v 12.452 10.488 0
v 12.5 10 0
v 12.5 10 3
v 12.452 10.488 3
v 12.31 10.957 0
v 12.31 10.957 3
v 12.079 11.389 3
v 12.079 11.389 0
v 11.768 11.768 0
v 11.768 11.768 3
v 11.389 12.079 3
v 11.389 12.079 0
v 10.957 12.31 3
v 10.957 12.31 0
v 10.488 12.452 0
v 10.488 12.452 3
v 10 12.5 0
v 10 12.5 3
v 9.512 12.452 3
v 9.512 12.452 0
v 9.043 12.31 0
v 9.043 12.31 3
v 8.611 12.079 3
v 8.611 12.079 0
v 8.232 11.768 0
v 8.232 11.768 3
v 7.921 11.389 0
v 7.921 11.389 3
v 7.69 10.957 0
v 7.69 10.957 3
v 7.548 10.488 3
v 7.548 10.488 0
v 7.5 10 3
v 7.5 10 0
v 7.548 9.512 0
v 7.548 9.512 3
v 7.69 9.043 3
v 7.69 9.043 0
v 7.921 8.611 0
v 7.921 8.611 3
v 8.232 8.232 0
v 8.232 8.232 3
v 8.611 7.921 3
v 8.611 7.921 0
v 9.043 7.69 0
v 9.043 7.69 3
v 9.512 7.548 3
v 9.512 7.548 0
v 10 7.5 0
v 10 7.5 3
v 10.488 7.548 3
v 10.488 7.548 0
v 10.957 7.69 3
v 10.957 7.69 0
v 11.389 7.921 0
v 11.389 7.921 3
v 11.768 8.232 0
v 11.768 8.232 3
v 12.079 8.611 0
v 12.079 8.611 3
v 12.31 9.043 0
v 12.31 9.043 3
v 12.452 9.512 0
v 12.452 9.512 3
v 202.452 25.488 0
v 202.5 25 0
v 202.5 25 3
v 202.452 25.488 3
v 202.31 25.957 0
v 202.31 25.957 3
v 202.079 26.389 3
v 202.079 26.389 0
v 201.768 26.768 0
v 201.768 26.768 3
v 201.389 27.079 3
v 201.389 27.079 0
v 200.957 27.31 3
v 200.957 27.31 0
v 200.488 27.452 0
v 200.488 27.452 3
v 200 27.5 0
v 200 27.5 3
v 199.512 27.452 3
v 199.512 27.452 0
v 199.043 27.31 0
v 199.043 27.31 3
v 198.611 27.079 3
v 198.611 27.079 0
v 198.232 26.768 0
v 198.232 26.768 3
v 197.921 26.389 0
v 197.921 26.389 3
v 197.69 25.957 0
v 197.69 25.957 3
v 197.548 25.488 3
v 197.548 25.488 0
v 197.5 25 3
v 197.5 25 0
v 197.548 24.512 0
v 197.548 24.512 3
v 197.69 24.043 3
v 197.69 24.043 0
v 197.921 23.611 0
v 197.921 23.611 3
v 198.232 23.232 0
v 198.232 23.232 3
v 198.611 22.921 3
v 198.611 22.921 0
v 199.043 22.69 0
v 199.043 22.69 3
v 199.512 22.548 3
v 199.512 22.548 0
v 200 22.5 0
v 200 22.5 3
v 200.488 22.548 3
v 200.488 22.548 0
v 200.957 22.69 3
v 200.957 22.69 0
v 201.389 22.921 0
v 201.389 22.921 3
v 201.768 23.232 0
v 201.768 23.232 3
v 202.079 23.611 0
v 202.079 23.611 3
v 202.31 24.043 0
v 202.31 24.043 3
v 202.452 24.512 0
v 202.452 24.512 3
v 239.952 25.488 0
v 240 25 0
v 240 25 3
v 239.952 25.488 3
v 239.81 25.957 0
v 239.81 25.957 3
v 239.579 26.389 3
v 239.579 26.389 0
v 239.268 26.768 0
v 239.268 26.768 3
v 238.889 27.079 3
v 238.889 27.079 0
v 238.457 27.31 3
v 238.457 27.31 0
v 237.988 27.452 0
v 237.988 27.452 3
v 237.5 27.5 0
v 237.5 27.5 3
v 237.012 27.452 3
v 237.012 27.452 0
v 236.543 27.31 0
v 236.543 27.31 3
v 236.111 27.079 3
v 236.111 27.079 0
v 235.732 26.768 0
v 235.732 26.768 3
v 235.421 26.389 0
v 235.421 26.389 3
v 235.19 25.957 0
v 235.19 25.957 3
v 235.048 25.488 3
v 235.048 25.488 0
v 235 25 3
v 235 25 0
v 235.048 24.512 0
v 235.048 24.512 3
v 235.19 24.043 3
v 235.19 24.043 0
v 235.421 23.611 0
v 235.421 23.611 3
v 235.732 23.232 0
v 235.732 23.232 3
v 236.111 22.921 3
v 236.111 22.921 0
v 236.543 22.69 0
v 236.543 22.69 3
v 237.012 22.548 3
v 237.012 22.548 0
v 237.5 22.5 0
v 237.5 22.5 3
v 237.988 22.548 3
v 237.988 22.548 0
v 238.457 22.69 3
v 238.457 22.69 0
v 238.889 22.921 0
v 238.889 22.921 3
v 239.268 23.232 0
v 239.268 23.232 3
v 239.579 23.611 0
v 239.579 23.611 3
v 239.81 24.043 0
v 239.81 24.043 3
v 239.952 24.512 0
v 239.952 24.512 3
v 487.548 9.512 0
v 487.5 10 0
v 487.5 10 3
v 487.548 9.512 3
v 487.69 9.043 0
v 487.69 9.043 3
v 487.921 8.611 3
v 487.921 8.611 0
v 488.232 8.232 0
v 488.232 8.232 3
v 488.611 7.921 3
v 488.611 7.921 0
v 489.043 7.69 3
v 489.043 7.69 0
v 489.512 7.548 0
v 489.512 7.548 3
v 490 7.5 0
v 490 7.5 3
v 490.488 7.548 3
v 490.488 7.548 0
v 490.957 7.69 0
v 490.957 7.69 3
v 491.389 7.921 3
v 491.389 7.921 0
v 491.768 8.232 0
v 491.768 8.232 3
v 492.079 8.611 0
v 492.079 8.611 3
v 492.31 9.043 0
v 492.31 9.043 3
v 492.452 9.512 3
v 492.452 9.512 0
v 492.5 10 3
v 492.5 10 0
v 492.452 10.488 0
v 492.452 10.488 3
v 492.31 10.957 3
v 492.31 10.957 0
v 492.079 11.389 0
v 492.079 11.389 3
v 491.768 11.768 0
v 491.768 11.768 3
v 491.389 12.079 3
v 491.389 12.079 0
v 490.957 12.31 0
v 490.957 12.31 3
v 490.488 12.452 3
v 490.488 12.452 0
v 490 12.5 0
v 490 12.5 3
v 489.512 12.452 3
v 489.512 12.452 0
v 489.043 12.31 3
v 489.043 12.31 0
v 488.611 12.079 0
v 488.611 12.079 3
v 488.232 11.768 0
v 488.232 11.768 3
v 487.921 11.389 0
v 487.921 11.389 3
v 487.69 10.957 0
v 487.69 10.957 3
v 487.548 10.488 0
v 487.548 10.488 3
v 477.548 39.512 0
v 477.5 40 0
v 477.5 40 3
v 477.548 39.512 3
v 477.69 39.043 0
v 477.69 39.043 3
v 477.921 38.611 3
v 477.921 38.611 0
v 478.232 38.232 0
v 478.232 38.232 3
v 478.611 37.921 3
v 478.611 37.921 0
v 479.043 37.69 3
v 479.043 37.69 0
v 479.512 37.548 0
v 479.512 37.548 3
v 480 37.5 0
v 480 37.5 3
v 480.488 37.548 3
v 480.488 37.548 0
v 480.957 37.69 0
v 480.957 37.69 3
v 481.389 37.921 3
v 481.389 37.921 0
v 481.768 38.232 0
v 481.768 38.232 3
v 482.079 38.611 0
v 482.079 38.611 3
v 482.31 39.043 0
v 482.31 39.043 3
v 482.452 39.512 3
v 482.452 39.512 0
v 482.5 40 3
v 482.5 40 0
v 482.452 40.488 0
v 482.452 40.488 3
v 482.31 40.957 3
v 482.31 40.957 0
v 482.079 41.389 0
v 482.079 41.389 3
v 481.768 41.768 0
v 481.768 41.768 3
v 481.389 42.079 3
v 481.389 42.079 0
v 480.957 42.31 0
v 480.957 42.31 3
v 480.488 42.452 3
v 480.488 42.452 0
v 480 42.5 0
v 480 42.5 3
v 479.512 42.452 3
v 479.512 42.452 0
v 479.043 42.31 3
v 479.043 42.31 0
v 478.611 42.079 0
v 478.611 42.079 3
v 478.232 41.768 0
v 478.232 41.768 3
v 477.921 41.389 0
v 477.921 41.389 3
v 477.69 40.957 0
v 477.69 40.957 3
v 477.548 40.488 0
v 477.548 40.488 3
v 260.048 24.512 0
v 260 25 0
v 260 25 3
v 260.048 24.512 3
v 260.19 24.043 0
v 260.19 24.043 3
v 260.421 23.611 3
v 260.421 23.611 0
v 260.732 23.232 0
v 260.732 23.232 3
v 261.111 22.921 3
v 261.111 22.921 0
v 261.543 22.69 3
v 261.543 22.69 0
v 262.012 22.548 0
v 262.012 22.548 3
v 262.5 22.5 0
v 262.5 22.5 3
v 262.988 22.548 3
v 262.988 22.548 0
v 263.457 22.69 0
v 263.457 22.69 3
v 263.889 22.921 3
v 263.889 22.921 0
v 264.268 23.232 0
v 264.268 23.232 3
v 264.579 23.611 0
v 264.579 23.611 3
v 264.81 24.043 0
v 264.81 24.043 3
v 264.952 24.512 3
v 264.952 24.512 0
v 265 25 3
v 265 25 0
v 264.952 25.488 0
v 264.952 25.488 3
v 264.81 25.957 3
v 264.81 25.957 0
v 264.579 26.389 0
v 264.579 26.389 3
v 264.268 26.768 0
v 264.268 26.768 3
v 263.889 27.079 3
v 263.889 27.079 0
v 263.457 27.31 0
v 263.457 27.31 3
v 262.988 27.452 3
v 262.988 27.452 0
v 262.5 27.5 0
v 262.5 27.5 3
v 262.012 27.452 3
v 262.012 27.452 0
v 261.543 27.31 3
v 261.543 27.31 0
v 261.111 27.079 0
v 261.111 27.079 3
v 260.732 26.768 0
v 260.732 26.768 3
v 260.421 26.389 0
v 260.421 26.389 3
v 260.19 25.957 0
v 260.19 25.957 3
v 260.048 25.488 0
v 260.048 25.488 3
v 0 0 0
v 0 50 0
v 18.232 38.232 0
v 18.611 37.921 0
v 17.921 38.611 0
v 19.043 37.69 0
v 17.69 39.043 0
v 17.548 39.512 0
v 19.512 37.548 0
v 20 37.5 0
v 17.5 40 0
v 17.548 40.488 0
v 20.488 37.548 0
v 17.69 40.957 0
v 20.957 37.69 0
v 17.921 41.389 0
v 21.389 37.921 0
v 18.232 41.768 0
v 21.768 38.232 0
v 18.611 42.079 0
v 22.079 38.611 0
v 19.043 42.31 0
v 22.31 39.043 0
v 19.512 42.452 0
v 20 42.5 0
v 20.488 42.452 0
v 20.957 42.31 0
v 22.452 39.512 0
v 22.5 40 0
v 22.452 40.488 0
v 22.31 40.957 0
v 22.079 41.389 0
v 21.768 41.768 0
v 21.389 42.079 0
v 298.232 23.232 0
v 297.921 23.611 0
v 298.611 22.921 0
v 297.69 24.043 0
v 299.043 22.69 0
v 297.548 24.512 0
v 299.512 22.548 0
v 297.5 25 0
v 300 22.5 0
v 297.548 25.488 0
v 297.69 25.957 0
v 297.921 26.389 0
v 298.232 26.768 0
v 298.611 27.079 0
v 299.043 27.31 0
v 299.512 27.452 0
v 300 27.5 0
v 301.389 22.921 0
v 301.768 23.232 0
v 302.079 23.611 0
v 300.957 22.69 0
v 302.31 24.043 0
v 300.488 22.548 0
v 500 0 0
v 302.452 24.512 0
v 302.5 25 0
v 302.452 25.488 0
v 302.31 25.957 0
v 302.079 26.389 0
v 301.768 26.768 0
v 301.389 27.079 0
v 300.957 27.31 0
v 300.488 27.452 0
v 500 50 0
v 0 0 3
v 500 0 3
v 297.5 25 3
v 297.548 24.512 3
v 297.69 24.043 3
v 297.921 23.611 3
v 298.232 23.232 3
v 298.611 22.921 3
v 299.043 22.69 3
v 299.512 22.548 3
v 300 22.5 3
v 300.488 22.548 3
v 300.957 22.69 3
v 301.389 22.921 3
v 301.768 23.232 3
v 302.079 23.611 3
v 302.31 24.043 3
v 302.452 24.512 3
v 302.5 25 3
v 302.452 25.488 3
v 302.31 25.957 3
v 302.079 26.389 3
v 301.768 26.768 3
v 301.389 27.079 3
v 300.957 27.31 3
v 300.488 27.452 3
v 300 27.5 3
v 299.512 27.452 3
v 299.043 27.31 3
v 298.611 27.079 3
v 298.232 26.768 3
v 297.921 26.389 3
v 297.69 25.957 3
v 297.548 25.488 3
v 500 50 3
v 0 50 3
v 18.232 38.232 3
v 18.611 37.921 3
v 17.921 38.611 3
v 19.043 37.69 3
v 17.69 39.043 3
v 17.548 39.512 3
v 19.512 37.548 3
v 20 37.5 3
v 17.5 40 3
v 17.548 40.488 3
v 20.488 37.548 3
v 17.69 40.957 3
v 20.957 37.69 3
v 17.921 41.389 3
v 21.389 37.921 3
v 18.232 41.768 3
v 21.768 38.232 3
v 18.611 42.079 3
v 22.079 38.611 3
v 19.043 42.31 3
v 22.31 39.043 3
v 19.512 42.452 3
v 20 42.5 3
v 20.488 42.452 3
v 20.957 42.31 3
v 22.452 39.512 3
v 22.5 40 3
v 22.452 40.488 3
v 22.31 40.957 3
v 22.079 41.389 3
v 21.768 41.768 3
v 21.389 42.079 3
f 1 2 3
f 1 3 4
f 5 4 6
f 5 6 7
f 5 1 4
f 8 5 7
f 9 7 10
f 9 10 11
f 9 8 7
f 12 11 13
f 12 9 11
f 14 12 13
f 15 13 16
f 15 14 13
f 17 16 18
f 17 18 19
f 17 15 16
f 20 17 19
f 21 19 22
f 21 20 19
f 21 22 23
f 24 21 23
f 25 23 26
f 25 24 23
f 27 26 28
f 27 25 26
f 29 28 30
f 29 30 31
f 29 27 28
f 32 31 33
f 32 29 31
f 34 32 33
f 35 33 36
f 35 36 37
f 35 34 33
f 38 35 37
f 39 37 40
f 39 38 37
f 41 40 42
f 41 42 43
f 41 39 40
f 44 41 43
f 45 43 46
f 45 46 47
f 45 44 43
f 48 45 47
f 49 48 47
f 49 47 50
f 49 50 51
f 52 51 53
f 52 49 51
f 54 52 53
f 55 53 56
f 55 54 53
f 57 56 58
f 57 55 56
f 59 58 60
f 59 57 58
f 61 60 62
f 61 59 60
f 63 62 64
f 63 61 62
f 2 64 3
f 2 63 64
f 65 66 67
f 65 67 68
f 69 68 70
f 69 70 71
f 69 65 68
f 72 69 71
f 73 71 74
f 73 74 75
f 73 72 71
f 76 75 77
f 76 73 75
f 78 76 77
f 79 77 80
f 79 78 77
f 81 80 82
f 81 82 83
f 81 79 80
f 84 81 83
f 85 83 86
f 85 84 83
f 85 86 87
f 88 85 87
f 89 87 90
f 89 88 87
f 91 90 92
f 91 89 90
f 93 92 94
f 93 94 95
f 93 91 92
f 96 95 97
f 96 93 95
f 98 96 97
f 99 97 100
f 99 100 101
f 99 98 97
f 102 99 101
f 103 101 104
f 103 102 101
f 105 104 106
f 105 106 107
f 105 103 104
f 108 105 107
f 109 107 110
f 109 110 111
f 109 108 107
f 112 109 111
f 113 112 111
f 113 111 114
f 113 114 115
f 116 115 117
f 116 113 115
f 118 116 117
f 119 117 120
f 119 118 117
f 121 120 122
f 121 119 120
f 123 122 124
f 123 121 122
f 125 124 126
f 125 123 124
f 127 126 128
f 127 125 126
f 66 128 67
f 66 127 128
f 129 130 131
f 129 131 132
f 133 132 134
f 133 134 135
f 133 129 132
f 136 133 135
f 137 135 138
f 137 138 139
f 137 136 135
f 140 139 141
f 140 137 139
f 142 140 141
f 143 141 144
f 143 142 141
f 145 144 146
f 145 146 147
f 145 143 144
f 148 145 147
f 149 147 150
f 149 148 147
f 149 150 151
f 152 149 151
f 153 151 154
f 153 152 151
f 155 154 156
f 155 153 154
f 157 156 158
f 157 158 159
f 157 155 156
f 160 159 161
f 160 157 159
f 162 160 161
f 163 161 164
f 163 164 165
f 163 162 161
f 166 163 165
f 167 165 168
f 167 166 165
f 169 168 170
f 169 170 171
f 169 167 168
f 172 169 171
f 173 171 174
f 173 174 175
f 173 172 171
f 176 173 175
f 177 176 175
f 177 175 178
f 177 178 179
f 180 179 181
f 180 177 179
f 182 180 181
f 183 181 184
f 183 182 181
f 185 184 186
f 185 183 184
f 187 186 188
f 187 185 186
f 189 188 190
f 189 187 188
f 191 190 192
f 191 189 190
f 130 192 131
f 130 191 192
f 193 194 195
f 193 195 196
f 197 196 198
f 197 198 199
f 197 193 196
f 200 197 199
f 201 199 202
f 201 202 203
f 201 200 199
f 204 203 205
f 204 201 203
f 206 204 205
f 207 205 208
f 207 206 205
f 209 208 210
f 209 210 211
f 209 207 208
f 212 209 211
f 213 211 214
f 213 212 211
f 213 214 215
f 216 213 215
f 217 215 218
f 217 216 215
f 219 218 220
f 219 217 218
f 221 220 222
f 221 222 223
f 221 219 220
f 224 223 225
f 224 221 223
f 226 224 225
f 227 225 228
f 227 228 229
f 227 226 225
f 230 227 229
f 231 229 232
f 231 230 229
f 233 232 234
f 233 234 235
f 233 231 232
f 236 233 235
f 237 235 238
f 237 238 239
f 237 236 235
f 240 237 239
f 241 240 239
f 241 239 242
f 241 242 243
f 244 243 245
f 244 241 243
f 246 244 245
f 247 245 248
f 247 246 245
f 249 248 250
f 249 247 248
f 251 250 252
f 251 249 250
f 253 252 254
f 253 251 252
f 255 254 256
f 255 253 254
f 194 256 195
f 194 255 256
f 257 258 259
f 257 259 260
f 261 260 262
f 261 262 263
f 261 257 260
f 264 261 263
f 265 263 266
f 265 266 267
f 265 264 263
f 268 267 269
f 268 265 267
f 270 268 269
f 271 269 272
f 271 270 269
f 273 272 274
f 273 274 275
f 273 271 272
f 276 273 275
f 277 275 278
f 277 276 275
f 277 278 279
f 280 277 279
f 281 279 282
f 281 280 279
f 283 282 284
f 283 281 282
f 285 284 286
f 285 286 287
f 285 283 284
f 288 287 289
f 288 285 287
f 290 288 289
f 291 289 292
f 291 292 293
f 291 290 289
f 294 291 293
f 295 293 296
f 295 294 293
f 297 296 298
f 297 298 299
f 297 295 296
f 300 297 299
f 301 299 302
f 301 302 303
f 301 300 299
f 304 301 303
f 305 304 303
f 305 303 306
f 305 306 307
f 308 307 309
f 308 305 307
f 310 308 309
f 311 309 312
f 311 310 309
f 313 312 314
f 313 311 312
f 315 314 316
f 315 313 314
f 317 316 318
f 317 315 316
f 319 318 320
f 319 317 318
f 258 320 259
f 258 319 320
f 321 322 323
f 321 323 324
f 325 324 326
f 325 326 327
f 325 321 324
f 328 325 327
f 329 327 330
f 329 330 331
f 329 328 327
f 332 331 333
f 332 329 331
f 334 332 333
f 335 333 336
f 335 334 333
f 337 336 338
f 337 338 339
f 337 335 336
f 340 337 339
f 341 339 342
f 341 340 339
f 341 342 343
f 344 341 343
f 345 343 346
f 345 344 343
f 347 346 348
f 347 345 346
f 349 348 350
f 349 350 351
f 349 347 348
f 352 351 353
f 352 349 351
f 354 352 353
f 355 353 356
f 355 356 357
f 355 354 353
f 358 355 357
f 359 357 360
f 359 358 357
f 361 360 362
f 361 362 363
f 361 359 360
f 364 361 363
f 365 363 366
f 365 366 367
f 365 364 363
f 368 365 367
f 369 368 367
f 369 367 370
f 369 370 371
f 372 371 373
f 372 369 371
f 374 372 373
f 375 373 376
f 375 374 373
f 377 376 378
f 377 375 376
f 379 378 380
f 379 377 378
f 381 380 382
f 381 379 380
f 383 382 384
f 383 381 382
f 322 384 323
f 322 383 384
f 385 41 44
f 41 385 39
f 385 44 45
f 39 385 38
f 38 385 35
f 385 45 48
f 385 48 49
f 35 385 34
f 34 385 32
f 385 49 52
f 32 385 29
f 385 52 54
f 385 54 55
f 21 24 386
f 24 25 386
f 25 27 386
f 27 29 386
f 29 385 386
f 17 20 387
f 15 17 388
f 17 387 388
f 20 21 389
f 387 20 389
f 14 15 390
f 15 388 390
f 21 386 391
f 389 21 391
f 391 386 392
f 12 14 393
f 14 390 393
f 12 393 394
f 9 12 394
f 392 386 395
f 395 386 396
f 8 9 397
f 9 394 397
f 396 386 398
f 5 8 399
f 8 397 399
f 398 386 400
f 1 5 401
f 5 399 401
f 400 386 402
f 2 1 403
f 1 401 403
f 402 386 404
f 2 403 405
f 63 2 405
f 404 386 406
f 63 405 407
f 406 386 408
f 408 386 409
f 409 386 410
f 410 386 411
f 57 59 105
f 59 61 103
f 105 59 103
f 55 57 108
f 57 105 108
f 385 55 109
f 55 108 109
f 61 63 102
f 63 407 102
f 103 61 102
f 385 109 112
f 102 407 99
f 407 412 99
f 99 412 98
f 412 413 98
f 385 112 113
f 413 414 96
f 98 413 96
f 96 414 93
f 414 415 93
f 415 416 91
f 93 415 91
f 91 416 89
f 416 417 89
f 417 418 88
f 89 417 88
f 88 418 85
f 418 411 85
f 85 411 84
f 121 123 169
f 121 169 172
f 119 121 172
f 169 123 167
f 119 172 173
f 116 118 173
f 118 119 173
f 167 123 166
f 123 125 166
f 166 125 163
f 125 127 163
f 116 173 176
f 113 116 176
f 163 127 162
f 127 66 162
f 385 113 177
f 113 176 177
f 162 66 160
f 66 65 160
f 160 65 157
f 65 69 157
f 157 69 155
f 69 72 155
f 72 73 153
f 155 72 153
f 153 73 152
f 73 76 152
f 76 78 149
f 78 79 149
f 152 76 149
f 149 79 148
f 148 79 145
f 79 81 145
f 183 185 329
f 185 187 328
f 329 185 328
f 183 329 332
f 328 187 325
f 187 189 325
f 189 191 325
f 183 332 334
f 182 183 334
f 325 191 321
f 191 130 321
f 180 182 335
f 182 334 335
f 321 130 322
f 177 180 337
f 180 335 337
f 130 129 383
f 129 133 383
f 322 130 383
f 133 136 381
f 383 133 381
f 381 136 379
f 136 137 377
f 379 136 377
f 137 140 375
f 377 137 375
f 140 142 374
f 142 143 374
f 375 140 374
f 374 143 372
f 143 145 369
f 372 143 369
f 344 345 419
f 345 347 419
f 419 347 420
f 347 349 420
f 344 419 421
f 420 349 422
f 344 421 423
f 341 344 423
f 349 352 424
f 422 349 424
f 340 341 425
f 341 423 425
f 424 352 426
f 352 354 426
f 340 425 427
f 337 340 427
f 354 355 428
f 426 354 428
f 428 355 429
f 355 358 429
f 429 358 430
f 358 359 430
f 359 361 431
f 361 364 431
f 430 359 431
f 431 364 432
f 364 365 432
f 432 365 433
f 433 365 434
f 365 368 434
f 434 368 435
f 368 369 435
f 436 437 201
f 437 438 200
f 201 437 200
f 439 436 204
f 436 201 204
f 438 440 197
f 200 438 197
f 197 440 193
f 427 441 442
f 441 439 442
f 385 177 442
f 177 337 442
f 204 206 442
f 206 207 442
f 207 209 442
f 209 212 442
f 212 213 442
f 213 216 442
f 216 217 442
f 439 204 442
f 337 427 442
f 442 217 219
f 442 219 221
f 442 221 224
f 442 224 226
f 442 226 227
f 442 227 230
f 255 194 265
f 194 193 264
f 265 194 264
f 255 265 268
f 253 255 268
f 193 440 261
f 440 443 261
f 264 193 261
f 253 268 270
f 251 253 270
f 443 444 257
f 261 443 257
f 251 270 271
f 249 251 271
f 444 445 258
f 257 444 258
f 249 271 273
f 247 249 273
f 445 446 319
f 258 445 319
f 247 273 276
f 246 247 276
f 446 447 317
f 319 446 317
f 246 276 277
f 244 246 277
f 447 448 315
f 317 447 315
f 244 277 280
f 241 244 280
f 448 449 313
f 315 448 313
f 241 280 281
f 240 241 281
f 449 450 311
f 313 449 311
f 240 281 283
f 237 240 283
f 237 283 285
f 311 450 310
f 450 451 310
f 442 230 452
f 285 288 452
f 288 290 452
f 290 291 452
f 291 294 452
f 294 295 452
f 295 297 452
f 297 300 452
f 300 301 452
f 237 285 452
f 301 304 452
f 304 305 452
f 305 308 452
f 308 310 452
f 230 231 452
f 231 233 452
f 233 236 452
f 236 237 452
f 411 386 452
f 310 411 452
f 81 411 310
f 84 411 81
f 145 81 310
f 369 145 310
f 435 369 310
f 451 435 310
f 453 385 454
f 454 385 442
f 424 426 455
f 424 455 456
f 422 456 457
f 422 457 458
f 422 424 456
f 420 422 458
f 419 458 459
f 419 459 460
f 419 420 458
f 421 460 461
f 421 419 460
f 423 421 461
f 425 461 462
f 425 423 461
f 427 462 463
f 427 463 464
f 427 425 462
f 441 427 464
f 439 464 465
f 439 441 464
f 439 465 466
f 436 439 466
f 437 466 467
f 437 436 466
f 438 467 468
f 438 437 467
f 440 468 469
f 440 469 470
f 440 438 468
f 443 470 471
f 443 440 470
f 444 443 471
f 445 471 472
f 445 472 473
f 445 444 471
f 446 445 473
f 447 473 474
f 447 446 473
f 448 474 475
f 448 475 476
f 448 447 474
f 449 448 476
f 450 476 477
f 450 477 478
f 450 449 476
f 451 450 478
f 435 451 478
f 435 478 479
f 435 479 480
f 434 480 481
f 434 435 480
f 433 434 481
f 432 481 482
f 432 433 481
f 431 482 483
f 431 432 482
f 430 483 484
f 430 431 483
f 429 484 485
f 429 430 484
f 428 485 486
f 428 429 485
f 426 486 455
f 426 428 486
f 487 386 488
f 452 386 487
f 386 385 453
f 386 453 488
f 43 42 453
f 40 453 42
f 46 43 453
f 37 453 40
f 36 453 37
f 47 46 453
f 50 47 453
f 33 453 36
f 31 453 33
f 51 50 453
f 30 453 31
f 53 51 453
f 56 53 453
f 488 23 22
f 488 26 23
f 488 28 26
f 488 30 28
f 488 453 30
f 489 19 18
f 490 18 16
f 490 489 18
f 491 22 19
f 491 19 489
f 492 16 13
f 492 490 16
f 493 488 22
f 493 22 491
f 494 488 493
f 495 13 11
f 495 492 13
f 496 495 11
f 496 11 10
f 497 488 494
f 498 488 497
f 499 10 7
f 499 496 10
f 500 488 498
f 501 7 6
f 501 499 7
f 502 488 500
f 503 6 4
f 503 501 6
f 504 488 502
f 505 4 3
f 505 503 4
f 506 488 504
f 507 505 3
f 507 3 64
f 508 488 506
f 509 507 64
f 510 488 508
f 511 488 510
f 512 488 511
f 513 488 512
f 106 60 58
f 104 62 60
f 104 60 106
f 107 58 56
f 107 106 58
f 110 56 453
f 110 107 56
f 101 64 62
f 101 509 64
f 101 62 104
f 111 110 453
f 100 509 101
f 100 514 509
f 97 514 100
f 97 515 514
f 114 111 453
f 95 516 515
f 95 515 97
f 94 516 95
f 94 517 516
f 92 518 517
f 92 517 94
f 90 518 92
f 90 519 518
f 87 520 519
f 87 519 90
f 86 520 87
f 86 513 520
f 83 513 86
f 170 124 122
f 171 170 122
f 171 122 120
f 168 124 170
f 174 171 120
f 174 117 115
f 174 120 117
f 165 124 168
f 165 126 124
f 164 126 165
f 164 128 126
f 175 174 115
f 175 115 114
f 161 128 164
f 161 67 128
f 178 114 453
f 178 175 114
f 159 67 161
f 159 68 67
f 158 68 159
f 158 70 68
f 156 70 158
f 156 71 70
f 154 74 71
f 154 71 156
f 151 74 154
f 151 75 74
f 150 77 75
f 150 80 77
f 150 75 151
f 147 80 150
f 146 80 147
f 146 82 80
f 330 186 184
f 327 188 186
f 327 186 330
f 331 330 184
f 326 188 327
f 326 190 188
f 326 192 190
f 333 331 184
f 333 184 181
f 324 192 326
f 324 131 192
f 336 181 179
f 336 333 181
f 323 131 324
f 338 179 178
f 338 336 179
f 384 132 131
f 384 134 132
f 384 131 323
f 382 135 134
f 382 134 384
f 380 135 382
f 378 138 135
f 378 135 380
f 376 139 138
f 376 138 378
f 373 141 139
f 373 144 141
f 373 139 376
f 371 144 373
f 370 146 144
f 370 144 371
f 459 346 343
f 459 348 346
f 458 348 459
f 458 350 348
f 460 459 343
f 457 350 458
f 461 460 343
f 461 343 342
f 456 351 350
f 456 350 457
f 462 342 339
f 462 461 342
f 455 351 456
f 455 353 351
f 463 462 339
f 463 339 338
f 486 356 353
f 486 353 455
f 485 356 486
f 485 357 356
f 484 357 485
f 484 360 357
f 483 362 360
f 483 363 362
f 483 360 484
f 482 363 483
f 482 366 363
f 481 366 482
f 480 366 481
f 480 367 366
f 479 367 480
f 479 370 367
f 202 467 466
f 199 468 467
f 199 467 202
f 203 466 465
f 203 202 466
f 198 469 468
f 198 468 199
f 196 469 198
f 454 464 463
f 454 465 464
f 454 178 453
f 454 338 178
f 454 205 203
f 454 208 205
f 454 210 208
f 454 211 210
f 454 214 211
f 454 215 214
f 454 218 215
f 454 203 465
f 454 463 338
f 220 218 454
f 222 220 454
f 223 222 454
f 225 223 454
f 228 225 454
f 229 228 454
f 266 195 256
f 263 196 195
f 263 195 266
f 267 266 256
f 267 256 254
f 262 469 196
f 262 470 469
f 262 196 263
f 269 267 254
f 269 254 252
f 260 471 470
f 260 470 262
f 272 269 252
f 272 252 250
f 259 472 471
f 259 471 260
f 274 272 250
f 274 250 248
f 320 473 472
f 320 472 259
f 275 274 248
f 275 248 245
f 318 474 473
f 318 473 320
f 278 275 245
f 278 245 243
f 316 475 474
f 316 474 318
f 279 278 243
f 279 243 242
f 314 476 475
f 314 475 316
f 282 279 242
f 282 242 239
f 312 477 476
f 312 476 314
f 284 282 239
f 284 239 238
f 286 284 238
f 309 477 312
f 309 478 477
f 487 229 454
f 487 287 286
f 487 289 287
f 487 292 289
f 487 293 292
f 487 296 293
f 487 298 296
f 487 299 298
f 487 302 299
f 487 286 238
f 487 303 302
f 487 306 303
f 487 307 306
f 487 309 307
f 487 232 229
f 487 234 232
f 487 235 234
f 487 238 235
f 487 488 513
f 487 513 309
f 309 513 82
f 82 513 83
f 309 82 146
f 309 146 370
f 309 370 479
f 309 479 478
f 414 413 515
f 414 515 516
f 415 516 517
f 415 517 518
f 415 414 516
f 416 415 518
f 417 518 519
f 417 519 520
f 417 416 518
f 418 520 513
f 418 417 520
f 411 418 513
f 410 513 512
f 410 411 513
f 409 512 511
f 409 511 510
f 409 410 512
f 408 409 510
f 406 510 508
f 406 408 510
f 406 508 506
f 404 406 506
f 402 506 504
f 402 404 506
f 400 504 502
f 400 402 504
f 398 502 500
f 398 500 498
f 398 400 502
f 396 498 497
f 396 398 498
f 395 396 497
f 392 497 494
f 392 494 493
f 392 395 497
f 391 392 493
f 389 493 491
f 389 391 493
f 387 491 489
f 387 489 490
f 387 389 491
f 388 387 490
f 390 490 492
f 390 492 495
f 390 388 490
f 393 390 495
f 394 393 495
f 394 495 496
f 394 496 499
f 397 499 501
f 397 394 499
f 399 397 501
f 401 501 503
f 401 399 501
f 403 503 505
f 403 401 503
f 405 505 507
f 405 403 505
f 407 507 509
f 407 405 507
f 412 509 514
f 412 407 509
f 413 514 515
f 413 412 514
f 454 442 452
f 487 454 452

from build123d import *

# Parameters (mm, degrees)
SKETCH1_W           = 500
SKETCH1_H           = 50
SKETCH1_R           = 2.5
BOSS_EXTRUDE1_DEPTH = 3


with BuildPart() as part:
    # Sketch1 → Boss-Extrude1 (new body)
    with BuildSketch(Plane.XY):
        with Locations((250, 25)):
            Rectangle(SKETCH1_W, SKETCH1_H)
        with Locations((20, 40)):
            Circle(SKETCH1_R, mode=Mode.SUBTRACT)
        with Locations((200, 25)):
            Circle(SKETCH1_R, mode=Mode.SUBTRACT)
        with Locations((237.5, 25)):
            Circle(SKETCH1_R, mode=Mode.SUBTRACT)
        with Locations((10, 10)):
            Circle(SKETCH1_R, mode=Mode.SUBTRACT)
        with Locations(Location((262.5, 25, 0), (0, 0, 180))):
            Circle(SKETCH1_R, mode=Mode.SUBTRACT)
        with Locations(Location((300, 25, 0), (0, 0, 180))):
            Circle(SKETCH1_R, mode=Mode.SUBTRACT)
        with Locations(Location((480, 40, 0), (0, 0, 180))):
            Circle(SKETCH1_R, mode=Mode.SUBTRACT)
        with Locations(Location((490, 10, 0), (0, 0, 180))):
            Circle(SKETCH1_R, mode=Mode.SUBTRACT)
    extrude(amount=BOSS_EXTRUDE1_DEPTH)


solid = part.part
